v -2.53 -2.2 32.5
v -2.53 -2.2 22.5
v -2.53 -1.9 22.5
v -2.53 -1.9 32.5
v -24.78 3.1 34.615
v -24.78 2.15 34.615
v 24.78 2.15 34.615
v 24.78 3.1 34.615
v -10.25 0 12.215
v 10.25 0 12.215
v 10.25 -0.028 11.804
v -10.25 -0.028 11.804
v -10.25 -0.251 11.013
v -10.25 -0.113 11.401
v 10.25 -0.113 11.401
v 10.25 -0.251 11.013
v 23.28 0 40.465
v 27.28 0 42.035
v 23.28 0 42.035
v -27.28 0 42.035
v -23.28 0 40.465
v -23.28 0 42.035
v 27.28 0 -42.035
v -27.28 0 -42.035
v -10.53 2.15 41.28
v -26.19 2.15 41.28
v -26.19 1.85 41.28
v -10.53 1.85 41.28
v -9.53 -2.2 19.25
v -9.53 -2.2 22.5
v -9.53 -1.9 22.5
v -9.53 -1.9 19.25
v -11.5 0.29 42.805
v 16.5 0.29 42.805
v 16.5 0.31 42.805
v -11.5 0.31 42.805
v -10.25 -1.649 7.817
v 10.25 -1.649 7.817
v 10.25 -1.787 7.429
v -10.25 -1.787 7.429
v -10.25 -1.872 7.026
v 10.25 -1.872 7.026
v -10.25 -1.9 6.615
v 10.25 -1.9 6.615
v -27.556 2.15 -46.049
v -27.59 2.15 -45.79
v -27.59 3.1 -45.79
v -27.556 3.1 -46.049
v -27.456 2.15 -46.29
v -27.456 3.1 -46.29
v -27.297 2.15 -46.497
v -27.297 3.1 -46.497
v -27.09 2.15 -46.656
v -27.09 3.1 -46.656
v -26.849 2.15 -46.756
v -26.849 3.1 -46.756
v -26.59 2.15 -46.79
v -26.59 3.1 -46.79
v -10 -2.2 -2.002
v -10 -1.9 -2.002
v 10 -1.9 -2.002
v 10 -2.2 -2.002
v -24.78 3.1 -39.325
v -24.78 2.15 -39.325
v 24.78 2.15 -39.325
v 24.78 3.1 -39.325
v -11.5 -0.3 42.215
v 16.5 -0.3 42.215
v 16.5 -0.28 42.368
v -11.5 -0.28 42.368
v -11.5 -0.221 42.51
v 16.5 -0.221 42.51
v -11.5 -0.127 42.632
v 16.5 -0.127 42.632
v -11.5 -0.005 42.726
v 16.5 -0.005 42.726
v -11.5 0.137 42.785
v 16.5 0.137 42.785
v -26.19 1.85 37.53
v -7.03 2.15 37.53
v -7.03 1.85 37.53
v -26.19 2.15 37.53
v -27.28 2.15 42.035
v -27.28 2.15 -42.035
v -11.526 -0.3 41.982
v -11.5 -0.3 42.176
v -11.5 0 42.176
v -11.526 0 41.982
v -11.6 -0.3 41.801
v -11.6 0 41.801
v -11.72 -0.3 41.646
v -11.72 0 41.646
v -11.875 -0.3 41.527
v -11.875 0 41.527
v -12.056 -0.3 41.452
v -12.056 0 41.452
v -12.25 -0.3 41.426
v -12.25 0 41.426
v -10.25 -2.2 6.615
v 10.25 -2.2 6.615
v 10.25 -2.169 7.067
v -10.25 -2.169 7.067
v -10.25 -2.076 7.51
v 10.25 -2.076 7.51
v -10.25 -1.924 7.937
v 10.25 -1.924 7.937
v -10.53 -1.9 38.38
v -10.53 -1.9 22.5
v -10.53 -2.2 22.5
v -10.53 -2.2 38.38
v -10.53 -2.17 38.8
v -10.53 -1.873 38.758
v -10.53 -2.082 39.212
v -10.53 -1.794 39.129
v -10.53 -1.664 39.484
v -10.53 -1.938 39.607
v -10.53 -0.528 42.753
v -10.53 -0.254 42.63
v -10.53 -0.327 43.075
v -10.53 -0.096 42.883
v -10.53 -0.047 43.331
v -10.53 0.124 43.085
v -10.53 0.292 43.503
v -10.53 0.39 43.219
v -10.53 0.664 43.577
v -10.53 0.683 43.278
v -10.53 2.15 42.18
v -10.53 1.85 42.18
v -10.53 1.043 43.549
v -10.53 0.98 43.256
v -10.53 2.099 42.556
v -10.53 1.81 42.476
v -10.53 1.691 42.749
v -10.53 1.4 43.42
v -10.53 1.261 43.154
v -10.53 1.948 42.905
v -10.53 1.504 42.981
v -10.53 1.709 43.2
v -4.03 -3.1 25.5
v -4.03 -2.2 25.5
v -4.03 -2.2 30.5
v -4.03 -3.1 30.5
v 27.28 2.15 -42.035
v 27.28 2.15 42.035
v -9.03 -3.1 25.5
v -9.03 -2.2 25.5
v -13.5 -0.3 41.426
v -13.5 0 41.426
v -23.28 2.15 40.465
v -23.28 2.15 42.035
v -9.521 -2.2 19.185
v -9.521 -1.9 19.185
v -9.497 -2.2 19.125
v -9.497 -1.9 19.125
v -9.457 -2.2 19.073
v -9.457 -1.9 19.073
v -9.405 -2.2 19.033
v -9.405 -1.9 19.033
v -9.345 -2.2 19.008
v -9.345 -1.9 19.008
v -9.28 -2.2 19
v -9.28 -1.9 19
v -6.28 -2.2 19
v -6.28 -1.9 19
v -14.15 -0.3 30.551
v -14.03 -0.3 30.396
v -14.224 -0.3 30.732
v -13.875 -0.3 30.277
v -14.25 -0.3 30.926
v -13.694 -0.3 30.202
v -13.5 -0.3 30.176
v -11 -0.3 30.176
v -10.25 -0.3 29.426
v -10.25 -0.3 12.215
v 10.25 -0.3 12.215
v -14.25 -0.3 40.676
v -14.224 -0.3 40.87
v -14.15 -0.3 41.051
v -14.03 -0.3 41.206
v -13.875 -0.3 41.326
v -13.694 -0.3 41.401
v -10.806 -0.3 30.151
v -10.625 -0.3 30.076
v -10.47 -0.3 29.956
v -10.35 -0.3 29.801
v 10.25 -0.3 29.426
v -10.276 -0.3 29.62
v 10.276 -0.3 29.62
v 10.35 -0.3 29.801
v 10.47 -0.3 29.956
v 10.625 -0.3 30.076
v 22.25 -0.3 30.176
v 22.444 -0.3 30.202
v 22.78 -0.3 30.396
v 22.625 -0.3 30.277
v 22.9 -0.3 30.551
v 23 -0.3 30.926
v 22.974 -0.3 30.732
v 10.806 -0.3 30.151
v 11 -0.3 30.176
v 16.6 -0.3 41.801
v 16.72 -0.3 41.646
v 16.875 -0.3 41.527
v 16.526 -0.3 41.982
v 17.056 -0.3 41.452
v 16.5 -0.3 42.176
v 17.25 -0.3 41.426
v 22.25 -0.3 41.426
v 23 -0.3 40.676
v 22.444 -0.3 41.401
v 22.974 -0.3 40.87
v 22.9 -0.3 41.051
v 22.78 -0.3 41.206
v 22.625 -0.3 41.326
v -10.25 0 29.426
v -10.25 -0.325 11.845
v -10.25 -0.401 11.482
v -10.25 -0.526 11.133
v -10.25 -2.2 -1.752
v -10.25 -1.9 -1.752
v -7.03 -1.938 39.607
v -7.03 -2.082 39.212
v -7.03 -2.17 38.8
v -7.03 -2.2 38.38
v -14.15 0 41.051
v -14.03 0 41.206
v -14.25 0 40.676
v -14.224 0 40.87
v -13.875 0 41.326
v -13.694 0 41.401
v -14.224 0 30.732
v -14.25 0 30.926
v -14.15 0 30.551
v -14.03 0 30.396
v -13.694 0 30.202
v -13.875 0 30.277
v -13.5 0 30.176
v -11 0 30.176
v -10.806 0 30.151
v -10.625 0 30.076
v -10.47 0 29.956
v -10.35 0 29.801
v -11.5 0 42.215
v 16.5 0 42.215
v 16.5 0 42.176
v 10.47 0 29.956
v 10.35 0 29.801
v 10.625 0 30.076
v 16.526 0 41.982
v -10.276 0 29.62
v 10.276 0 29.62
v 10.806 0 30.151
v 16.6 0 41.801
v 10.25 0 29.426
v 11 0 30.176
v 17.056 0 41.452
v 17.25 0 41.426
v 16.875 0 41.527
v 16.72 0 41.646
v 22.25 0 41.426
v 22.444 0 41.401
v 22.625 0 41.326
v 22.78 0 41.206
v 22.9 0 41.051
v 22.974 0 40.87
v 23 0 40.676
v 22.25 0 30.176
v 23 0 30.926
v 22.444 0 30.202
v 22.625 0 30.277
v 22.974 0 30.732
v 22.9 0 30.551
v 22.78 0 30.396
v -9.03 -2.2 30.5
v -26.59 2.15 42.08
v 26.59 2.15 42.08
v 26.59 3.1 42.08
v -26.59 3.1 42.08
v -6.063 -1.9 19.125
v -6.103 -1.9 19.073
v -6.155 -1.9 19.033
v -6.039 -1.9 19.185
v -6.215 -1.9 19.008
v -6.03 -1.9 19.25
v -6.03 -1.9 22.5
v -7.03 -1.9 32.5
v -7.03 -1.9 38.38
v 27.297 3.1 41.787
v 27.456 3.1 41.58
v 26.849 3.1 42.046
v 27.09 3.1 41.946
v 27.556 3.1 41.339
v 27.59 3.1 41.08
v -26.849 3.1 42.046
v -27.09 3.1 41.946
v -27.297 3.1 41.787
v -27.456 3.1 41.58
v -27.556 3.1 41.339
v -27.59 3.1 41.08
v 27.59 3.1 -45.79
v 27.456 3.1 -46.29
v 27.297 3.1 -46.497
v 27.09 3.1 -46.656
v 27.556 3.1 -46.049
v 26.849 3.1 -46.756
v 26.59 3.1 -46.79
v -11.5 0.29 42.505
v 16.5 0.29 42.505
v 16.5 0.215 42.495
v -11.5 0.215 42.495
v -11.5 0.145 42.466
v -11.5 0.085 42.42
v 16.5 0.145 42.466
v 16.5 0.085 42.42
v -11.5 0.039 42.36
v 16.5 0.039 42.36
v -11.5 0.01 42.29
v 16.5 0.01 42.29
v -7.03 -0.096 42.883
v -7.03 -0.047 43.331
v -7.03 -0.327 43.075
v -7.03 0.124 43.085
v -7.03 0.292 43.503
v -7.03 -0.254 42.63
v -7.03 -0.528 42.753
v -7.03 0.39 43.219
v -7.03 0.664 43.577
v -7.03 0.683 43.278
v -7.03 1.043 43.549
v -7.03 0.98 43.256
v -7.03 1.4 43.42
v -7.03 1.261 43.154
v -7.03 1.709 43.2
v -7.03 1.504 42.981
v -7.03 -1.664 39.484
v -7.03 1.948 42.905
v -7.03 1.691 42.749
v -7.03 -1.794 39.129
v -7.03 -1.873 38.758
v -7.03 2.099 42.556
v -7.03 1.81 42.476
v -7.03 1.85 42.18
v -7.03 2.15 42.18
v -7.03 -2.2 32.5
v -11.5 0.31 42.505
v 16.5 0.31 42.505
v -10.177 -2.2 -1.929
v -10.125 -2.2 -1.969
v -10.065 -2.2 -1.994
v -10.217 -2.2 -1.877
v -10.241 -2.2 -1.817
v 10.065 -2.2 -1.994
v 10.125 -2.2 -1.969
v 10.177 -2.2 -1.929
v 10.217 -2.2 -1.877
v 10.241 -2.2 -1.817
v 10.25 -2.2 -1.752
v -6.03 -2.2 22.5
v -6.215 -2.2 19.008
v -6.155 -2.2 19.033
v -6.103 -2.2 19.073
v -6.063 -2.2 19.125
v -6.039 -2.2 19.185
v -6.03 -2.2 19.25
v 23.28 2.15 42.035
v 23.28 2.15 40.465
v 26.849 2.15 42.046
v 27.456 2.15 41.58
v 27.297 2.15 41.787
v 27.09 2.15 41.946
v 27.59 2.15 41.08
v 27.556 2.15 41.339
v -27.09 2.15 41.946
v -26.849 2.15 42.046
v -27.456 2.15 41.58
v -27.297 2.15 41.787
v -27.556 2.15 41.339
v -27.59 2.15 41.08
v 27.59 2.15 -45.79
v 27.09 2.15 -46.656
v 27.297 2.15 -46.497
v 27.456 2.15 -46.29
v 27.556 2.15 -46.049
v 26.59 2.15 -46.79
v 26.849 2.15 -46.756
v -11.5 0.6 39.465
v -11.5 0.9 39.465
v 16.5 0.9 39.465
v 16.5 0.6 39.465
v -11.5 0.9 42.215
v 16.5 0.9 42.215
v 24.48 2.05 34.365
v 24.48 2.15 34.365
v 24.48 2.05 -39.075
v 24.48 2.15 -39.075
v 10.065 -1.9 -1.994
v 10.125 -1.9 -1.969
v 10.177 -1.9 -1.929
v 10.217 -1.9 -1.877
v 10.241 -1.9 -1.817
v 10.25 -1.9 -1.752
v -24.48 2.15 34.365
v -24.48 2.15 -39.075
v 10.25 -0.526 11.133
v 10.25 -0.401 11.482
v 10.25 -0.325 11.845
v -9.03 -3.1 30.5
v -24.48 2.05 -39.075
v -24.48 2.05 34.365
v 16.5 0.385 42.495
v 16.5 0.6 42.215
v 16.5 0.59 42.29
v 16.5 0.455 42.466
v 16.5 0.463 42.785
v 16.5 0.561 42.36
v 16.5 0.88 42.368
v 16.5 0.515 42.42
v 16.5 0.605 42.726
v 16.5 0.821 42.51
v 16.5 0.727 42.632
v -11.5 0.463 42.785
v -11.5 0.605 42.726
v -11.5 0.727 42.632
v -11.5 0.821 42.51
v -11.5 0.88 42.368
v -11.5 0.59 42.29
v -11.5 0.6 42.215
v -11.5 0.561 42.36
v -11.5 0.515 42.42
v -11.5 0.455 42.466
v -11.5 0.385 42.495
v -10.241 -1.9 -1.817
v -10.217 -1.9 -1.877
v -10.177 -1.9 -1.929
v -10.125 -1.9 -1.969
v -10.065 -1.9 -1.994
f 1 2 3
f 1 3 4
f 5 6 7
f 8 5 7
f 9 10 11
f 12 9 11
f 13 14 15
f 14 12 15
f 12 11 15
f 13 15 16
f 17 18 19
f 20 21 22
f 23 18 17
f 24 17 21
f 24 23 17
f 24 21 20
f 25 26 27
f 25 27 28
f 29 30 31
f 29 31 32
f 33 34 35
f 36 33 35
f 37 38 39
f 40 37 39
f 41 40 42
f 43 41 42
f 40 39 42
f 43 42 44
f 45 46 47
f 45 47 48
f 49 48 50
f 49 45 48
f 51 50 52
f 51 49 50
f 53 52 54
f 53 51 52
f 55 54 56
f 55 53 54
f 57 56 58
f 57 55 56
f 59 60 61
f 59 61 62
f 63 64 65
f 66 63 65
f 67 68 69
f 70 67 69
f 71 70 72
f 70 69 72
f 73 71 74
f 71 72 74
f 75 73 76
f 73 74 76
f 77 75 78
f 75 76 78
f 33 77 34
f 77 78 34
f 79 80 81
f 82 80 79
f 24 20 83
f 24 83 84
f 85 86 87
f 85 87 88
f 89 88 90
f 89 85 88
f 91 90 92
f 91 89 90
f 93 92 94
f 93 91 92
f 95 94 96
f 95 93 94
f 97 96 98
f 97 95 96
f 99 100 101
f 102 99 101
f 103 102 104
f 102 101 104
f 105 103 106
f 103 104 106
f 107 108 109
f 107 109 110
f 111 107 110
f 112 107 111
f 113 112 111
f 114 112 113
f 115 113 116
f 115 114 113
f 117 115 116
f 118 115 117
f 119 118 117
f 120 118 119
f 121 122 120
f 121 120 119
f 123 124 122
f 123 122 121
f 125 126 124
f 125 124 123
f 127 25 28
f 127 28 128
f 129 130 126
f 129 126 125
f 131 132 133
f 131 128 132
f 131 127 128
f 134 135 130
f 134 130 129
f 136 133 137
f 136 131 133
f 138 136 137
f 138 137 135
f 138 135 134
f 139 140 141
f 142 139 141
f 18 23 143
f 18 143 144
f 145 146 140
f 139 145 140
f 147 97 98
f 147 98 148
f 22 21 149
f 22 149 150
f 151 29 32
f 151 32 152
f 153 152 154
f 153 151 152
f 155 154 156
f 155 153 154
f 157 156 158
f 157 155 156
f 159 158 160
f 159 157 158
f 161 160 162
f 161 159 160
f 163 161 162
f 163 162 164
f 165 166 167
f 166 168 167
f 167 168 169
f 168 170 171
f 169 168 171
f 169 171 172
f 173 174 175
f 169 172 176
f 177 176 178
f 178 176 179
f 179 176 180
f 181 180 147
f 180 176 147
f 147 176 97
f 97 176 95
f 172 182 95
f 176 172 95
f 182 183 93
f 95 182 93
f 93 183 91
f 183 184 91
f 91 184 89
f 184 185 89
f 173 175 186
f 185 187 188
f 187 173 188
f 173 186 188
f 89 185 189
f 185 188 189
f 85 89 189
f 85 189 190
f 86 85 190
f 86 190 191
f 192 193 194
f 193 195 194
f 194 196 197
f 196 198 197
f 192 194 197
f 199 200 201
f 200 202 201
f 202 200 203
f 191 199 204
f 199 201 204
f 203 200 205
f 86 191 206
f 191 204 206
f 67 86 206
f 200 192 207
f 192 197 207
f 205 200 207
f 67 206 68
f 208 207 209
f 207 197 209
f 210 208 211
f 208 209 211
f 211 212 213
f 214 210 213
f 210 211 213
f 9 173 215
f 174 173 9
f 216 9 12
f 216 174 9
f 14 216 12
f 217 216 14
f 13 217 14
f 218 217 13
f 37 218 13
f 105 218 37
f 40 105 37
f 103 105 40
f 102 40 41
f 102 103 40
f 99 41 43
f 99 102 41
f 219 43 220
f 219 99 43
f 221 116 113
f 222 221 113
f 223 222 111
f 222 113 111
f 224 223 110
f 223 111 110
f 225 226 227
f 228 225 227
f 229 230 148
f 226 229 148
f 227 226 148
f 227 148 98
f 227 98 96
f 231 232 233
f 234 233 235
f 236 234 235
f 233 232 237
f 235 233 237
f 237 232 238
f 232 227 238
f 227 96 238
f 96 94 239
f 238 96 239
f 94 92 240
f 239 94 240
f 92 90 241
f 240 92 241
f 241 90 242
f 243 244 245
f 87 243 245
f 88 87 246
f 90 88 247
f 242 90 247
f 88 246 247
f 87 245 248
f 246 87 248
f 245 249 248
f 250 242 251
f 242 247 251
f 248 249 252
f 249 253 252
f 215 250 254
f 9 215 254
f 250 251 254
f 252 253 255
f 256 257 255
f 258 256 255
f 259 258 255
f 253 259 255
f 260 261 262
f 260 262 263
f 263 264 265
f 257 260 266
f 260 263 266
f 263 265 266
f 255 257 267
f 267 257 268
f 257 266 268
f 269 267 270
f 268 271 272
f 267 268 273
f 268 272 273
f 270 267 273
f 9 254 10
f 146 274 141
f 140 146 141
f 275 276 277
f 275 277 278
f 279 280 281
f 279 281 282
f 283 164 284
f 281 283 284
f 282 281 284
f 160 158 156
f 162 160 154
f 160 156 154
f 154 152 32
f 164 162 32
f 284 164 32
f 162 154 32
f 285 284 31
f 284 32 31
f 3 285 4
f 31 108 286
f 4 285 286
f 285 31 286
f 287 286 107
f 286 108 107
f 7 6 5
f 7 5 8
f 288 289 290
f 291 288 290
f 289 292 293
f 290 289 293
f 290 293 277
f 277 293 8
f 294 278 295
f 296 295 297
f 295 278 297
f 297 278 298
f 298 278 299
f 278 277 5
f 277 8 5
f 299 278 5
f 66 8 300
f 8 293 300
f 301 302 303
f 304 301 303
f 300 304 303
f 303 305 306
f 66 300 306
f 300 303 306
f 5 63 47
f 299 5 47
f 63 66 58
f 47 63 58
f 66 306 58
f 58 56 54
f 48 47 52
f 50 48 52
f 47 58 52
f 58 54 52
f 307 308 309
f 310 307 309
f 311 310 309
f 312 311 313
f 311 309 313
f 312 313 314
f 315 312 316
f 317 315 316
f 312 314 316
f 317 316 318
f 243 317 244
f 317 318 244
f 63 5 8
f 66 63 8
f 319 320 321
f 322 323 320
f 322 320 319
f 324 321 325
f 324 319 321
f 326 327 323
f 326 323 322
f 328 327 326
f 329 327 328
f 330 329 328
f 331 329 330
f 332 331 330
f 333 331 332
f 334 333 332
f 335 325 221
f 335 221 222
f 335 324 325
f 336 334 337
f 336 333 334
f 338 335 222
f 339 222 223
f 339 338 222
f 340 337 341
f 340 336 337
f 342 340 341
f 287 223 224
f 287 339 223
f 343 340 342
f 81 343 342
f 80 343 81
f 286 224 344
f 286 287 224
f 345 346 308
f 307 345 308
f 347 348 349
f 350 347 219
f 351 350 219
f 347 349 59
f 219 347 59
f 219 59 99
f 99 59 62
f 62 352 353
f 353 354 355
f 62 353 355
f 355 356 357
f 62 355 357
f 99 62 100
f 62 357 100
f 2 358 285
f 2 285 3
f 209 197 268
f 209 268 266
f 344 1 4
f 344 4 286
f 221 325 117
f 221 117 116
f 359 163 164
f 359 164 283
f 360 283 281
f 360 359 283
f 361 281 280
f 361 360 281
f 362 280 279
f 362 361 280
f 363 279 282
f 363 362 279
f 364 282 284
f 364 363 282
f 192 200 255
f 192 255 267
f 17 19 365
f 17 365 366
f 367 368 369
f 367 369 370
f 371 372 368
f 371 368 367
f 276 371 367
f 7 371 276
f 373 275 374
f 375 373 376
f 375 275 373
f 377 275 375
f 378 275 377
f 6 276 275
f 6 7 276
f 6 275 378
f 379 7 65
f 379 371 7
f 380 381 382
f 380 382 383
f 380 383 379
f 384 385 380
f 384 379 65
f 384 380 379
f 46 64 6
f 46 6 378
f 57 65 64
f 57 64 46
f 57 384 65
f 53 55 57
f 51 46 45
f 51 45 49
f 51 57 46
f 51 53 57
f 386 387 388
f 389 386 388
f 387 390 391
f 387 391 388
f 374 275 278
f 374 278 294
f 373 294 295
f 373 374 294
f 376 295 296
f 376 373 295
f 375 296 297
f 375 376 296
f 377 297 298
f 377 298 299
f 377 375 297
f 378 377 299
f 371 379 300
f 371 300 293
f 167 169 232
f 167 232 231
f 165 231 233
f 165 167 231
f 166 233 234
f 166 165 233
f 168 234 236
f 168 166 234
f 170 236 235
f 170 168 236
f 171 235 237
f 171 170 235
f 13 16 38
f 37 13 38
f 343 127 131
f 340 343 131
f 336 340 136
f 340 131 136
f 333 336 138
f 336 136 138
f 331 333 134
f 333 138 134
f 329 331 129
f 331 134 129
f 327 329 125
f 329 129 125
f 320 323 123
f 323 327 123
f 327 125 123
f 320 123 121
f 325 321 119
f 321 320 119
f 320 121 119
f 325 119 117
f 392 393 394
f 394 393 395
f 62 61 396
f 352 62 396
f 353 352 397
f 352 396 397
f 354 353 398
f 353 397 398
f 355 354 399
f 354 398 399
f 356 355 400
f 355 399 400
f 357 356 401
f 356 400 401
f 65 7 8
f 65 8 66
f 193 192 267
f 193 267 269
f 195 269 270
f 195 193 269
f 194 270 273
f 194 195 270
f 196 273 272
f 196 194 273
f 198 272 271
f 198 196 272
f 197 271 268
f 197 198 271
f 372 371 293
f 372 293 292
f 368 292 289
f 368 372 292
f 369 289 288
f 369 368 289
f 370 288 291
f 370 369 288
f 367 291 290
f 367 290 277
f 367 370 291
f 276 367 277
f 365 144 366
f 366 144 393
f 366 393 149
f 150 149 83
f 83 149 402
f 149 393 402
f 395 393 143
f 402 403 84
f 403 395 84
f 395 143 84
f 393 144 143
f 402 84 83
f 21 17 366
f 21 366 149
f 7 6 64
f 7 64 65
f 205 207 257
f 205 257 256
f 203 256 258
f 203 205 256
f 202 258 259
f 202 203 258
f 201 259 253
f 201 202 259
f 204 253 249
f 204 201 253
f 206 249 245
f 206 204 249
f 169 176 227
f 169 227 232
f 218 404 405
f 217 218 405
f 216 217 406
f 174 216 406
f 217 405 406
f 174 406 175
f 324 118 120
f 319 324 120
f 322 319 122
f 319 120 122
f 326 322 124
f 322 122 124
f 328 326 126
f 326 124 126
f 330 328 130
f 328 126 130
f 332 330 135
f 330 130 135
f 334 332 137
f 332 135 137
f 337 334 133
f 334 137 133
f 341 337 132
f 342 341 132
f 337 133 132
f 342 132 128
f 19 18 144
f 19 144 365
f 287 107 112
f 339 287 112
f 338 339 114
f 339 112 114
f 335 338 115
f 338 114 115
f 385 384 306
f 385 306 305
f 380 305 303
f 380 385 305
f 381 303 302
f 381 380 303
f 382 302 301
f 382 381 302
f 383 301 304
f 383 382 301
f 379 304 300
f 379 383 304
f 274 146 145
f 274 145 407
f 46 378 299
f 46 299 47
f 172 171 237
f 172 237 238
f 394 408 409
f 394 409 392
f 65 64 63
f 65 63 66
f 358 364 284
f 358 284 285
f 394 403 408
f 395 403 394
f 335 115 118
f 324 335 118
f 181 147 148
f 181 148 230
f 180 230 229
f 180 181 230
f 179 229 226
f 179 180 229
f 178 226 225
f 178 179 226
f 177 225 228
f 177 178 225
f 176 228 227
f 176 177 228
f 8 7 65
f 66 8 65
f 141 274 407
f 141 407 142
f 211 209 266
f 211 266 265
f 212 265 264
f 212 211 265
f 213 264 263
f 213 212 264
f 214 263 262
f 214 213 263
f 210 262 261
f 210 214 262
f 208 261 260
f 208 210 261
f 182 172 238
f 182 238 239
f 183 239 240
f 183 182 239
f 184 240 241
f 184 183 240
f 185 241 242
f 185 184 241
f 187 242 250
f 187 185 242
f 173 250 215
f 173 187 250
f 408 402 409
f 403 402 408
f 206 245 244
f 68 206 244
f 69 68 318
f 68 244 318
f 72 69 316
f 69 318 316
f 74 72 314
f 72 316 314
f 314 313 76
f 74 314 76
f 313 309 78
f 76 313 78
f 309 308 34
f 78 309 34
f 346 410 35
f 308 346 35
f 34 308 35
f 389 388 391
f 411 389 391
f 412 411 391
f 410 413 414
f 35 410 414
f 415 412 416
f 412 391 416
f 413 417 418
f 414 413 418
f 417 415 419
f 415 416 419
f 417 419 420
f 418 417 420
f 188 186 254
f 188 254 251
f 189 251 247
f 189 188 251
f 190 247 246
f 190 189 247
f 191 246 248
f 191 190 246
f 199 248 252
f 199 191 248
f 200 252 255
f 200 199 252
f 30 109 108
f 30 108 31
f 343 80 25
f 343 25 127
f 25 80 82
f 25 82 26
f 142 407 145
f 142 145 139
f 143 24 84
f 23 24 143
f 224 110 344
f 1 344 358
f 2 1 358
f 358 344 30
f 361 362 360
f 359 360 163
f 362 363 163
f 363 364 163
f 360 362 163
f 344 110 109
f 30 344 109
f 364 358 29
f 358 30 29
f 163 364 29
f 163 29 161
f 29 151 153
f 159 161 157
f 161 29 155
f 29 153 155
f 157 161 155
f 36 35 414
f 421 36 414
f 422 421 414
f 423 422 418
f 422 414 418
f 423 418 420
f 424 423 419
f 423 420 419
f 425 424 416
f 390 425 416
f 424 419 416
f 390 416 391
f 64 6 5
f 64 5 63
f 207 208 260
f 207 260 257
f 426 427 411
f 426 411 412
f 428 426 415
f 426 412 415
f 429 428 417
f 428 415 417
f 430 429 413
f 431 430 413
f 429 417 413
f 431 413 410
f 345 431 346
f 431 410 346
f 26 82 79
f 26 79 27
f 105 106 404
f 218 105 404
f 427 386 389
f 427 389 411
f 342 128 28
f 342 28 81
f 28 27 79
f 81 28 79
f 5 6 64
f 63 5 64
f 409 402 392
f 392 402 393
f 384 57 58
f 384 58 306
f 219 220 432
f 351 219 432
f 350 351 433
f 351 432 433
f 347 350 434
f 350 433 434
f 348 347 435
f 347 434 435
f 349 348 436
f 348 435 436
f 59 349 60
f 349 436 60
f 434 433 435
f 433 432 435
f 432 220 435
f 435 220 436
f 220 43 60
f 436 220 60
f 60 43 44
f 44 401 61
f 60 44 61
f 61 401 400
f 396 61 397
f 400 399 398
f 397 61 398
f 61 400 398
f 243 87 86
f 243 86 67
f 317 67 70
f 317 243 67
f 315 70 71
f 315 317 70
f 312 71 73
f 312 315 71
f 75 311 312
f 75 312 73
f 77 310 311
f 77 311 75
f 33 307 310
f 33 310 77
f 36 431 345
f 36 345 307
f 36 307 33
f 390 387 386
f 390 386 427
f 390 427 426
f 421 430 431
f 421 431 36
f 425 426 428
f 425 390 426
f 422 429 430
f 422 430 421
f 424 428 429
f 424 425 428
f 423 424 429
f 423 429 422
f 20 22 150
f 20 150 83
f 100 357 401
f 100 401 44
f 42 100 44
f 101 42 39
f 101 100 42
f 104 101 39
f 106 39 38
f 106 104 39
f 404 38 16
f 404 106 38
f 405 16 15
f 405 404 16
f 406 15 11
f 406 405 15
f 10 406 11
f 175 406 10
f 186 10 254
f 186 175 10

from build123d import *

# Parameters (mm, degrees)
LCD_BEZEL_DEPTH                 = 2.15
SKETCH2_W                       = 48.96
SKETCH2_H                       = 73.44
LCD_DEPTH                       = 0.1
SKETCH3_W                       = 49.56
SKETCH3_H                       = 73.94
CTP_BEZEL_DEPTH                 = 0.95
SKETCH4_W                       = 49.56
SKETCH4_H                       = 73.94
CTP_WINDOW_DEPTH                = 0.95
CTP_START                       = -27.59
CTP_FPC_FOLDED_EXTRUDE_DEPTH    = 30
SKETCH17_OUTSIDE_W              = 78.384
SKETCH17_OUTSIDE_H              = 113.574
CTP_FPC_FOLDED_ATTACHMENT_DEPTH = 0.3
SKETCH18_OUTSIDE_W              = 78.384
SKETCH18_OUTSIDE_H              = 113.574
CTP_FPC_FOLDED_END_DEPTH        = 0.3
SKETCH28_W                      = 22.56397635
SKETCH28_H                      = 16.140021554
SKETCH28_W_2                    = 17.009896394
SKETCH28_H_2                    = 16.522845441
CTP_FPC_FOLDED_CLEANUP_DEPTH    = 5.05
SKETCH24_W                      = 5
SKETCH24_H                      = 5
CTP_IC_FOLDED_DEPTH             = 0.9
LCD_START                       = 27.28
LCD_FPC_FOLDED_EXTRUDE_DEPTH    = 50
SKETCH26_OUTSIDE_W              = 78.394
SKETCH26_OUTSIDE_H              = 113.584
SKETCH26_OUTSIDE_W_2            = 28
SKETCH26_OUTSIDE_H_2            = 11.282317896
LCD_FPC_FOLDED_ATTACHMENT_DEPTH = 0.3
SKETCH27_OUTSIDE_W              = 78.394
SKETCH27_OUTSIDE_H              = 113.584
LCD_FPC_FOLDED_END_DEPTH        = 3.8
LCD_FPC_FOLDED_END_DEPTH_BACK   = 0.3
SKETCH29_W                      = 16.012596684
SKETCH29_H                      = 10.316486409
SKETCH29_W_2                    = 18.754120511
SKETCH29_H_2                    = 8.206348681
LCD_FPC_FOLDED_CLEANUP_DEPTH    = 0.6


with BuildPart() as part:
    # Sketch1 → LCD Bezel (new body)
    with BuildSketch(Plane(origin=(0, 0, 0), x_dir=(1, 0, 0), z_dir=(0, 1, 0))):
        Polygon((27.28, 42.035), (27.28, -42.035), (23.28, -42.035), (23.28, -40.465), (-23.28, -40.465), (-23.28, -42.035), (-27.28, -42.035), (-27.28, 42.035), align=None)
    extrude(amount=LCD_BEZEL_DEPTH)

    # Sketch2 → LCD (cut)
    with BuildSketch(Plane(origin=(0, 2.15, 0), x_dir=(1, 0, 0), z_dir=(0, 1, 0))):
        with Locations((0, 2.355)):
            Rectangle(SKETCH2_W, SKETCH2_H)
    extrude(amount=-LCD_DEPTH, mode=Mode.SUBTRACT)


with BuildPart() as body_2:
    # Sketch3 → CTP Bezel (new body)
    with BuildSketch(Plane(origin=(0, 2.15, 0), x_dir=(1, 0, 0), z_dir=(0, 1, 0))):
        with BuildLine():
            Line((-26.59, 46.79), (26.59, 46.79))
            ThreePointArc((26.59, 46.79), (27.297106781, 46.497106781), (27.59, 45.79))
            Line((27.59, 45.79), (27.59, -41.08))
            ThreePointArc((27.59, -41.08), (27.297106781, -41.787106781), (26.59, -42.08))
            Line((26.59, -42.08), (-26.59, -42.08))
            ThreePointArc((-26.59, -42.08), (-27.297106781, -41.787106781), (-27.59, -41.08))
            Line((-27.59, -41.08), (-27.59, 45.79))
            ThreePointArc((-27.59, 45.79), (-27.297106781, 46.497106781), (-26.59, 46.79))
        make_face()
        with Locations((0, 2.355)):
            Rectangle(SKETCH3_W, SKETCH3_H, mode=Mode.SUBTRACT)
    extrude(amount=CTP_BEZEL_DEPTH)


with BuildPart() as body_3:
    # Sketch4 → CTP Window (new body)
    with BuildSketch(Plane(origin=(0, 2.15, 0), x_dir=(1, 0, 0), z_dir=(0, 1, 0))):
        with Locations((0, 2.355)):
            Rectangle(SKETCH4_W, SKETCH4_H)
    extrude(amount=CTP_WINDOW_DEPTH)


with BuildPart() as body_4:
    # Sketch16 → CTP FPC Folded Extrude (new body)
    with BuildSketch(Plane(origin=(0, 0, 0), x_dir=(0, 0, -1), z_dir=(1, 0, 0)).offset(CTP_START)):
        with BuildLine():
            Line((-37.53, 2.15), (-42.08, 2.15))
            Line((-42.08, 2.15), (-42.18, 2.15))
            ThreePointArc((-42.18, 2.15), (-43.549037452, 1.042807879), (-42.752664219, -0.527519351))
            Line((-42.752664219, -0.527519351), (-39.607137612, -1.937541466))
            ThreePointArc((-39.607137612, -1.937541466), (-39.007445456, -2.133651683), (-38.38, -2.2))
            Line((-38.38, -2.2), (-18.999583084, -2.2))
            Line((-18.999583084, -2.2), (-18.999583084, -1.9))
            Line((-18.999583084, -1.9), (-38.38, -1.9))
            ThreePointArc((-38.38, -1.9), (-38.94470091, -1.840286515), (-39.484423851, -1.66378732))
            Line((-39.484423851, -1.66378732), (-42.629950458, -0.253765204))
            ThreePointArc((-42.629950458, -0.253765204), (-43.255672284, 0.980063334), (-42.18, 1.85))
            Line((-42.18, 1.85), (-42.08, 1.85))
            Line((-42.08, 1.85), (-37.53, 1.85))
            Line((-37.53, 1.85), (-37.53, 2.15))
        make_face()
    extrude(amount=CTP_FPC_FOLDED_EXTRUDE_DEPTH)

    # Sketch17 outside → CTP FPC Folded Attachment (cut)
    with BuildSketch(Plane.XZ.offset(-2.15)):
        with Locations((0, -1.605)):
            Rectangle(SKETCH17_OUTSIDE_W, SKETCH17_OUTSIDE_H)
        Polygon((-7.03, 48.454000558), (-7.03, 37.53), (-26.19, 37.53), (-26.19, 41.28), (-10.53, 41.28), (-10.53, 48.454000558), align=None, mode=Mode.SUBTRACT)
    extrude(amount=CTP_FPC_FOLDED_ATTACHMENT_DEPTH, mode=Mode.SUBTRACT)

    # Sketch18 outside → CTP FPC Folded End (cut)
    with BuildSketch(Plane.XZ.offset(2.2)):
        with Locations((0, -1.605)):
            Rectangle(SKETCH18_OUTSIDE_W, SKETCH18_OUTSIDE_H)
        with BuildLine():
            Line((-10.53, 49.501364097), (-10.53, 22.499583084))
            Line((-10.53, 22.499583084), (-9.53, 22.499583084))
            Line((-9.53, 22.499583084), (-9.53, 19.249583084))
            ThreePointArc((-9.53, 19.249583084), (-9.456776695, 19.072806389), (-9.28, 18.999583084))
            Line((-9.28, 18.999583084), (-6.28, 18.999583084))
            ThreePointArc((-6.28, 18.999583084), (-6.103223305, 19.072806389), (-6.03, 19.249583084))
            Line((-6.03, 19.249583084), (-6.03, 22.499583084))
            Line((-6.03, 22.499583084), (-2.53, 22.499583084))
            Line((-2.53, 22.499583084), (-2.53, 32.499583084))
            Line((-2.53, 32.499583084), (-7.03, 32.499583084))
            Line((-7.03, 32.499583084), (-7.03, 49.501364097))
            Line((-7.03, 49.501364097), (-10.53, 49.501364097))
        make_face(mode=Mode.SUBTRACT)
    extrude(amount=-CTP_FPC_FOLDED_END_DEPTH, mode=Mode.SUBTRACT)

    # Sketch28 → CTP FPC Folded Cleanup (cut, through all)
    with BuildSketch(Plane.XZ.offset(-1.85)):
        with Locations((-21.811988175, 40.846754759)):
            Rectangle(SKETCH28_W, SKETCH28_H)
        with Locations((1.474948197, 40.761005805)):
            Rectangle(SKETCH28_W_2, SKETCH28_H_2)
    extrude(amount=CTP_FPC_FOLDED_CLEANUP_DEPTH, mode=Mode.SUBTRACT)


with BuildPart() as body_5:
    # Sketch24 → CTP IC Folded (new body)
    with BuildSketch(Plane.XZ.offset(2.2)):
        with Locations((-6.53, 27.999583084)):
            Rectangle(SKETCH24_W, SKETCH24_H)
    extrude(amount=CTP_IC_FOLDED_DEPTH)


with BuildPart() as body_6:
    # Sketch25 → LCD FPC Folded Extrude (new body)
    with BuildSketch(Plane(origin=(0, 0, 0), x_dir=(0, 0, -1), z_dir=(1, 0, 0)).offset(LCD_START)):
        with BuildLine():
            Line((-39.465, 0.6), (-40.465, 0.6))
            Line((-40.465, 0.6), (-42.215, 0.6))
            ThreePointArc((-42.215, 0.6), (-42.420060967, 0.515060967), (-42.505, 0.31))
            Line((-42.505, 0.31), (-42.505, 0.29))
            ThreePointArc((-42.505, 0.29), (-42.420060967, 0.084939033), (-42.215, 0))
            Line((-42.215, 0), (-30.17606187, 0))
            Line((-30.17606187, 0), (-12.215, 0))
            ThreePointArc((-12.215, 0), (-11.601108636, -0.063482097), (-11.013198014, -0.251241738))
            Line((-11.013198014, -0.251241738), (-7.816801986, -1.648758262))
            ThreePointArc((-7.816801986, -1.648758262), (-7.228891364, -1.836517903), (-6.615, -1.9))
            Line((-6.615, -1.9), (2.002351526, -1.9))
            Line((2.002351526, -1.9), (2.002351526, -2.2))
            Line((2.002351526, -2.2), (-6.615, -2.2))
            ThreePointArc((-6.615, -2.2), (-7.2902805, -2.130169693), (-7.936982185, -1.923634089))
            Line((-7.936982185, -1.923634089), (-11.133378212, -0.526117564))
            ThreePointArc((-11.133378212, -0.526117564), (-11.662497773, -0.357133887), (-12.215, -0.3))
            Line((-12.215, -0.3), (-30.17606187, -0.3))
            Line((-30.17606187, -0.3), (-42.215, -0.3))
            ThreePointArc((-42.215, -0.3), (-42.632193001, -0.127193001), (-42.805, 0.29))
            Line((-42.805, 0.29), (-42.805, 0.31))
            ThreePointArc((-42.805, 0.31), (-42.632193001, 0.727193001), (-42.215, 0.9))
            Line((-42.215, 0.9), (-40.465, 0.9))
            Line((-40.465, 0.9), (-39.465, 0.9))
            Line((-39.465, 0.9), (-39.465, 0.6))
        make_face()
    extrude(amount=-LCD_FPC_FOLDED_EXTRUDE_DEPTH)

    # Sketch26 outside → LCD FPC Folded Attachment (cut)
    with BuildSketch(Plane(origin=(0, 0.9, 0), x_dir=(1, 0, 0), z_dir=(0, 1, 0))):
        with Locations((0, 1.605)):
            Rectangle(SKETCH26_OUTSIDE_W, SKETCH26_OUTSIDE_H)
        with Locations((2.5, -45.106158948)):
            Rectangle(SKETCH26_OUTSIDE_W_2, SKETCH26_OUTSIDE_H_2, mode=Mode.SUBTRACT)
    extrude(amount=-LCD_FPC_FOLDED_ATTACHMENT_DEPTH, mode=Mode.SUBTRACT)

    # Sketch27 outside → LCD FPC Folded End (cut, two sides)
    with BuildSketch(Plane.XZ.offset(0.3)) as lcd_fpc_folded_end_sk:
        with Locations((0, -1.605)):
            Rectangle(SKETCH27_OUTSIDE_W, SKETCH27_OUTSIDE_H)
        with BuildLine():
            Line((-10.25, 29.42606187), (-10.25, -1.752351526))
            ThreePointArc((-10.25, -1.752351526), (-10.176776695, -1.929128221), (-10, -2.002351526))
            Line((-10, -2.002351526), (10, -2.002351526))
            ThreePointArc((10, -2.002351526), (10.176776695, -1.929128221), (10.25, -1.752351526))
            Line((10.25, -1.752351526), (10.25, 29.42606187))
            ThreePointArc((10.25, 29.42606187), (10.469669914, 29.956391955), (11, 30.17606187))
            Line((11, 30.17606187), (22.25, 30.17606187))
            ThreePointArc((22.25, 30.17606187), (22.780330086, 30.395731784), (23, 30.92606187))
            Line((23, 30.92606187), (23, 40.67606187))
            ThreePointArc((23, 40.67606187), (22.780330086, 41.206391955), (22.25, 41.42606187))
            Line((22.25, 41.42606187), (17.25, 41.42606187))
            ThreePointArc((17.25, 41.42606187), (16.719669914, 41.645731784), (16.5, 42.17606187))
            Line((16.5, 42.17606187), (16.5, 50.399703005))
            Line((16.5, 50.399703005), (-11.5, 50.399703005))
            Line((-11.5, 50.399703005), (-11.5, 42.17606187))
            ThreePointArc((-11.5, 42.17606187), (-11.719669914, 41.645731784), (-12.25, 41.42606187))
            Line((-12.25, 41.42606187), (-13.5, 41.42606187))
            ThreePointArc((-13.5, 41.42606187), (-14.030330086, 41.206391955), (-14.25, 40.67606187))
            Line((-14.25, 40.67606187), (-14.25, 30.92606187))
            ThreePointArc((-14.25, 30.92606187), (-14.030330086, 30.395731784), (-13.5, 30.17606187))
            Line((-13.5, 30.17606187), (-11, 30.17606187))
            ThreePointArc((-11, 30.17606187), (-10.469669914, 29.956391955), (-10.25, 29.42606187))
        make_face(mode=Mode.SUBTRACT)
    extrude(amount=LCD_FPC_FOLDED_END_DEPTH, mode=Mode.SUBTRACT)
    extrude(lcd_fpc_folded_end_sk.sketch, amount=-LCD_FPC_FOLDED_END_DEPTH_BACK, mode=Mode.SUBTRACT)

    # Sketch29 → LCD FPC Folded Cleanup (cut)
    with BuildSketch(Plane.XZ.offset(-0.6)):
        with Locations((-19.506298342, 47.334305075)):
            Rectangle(SKETCH29_W, SKETCH29_H)
        with Locations((25.877060256, 46.279236211)):
            Rectangle(SKETCH29_W_2, SKETCH29_H_2)
    extrude(amount=LCD_FPC_FOLDED_CLEANUP_DEPTH, mode=Mode.SUBTRACT)


solid = Compound([part.part, body_2.part, body_3.part, body_4.part, body_5.part, body_6.part])
